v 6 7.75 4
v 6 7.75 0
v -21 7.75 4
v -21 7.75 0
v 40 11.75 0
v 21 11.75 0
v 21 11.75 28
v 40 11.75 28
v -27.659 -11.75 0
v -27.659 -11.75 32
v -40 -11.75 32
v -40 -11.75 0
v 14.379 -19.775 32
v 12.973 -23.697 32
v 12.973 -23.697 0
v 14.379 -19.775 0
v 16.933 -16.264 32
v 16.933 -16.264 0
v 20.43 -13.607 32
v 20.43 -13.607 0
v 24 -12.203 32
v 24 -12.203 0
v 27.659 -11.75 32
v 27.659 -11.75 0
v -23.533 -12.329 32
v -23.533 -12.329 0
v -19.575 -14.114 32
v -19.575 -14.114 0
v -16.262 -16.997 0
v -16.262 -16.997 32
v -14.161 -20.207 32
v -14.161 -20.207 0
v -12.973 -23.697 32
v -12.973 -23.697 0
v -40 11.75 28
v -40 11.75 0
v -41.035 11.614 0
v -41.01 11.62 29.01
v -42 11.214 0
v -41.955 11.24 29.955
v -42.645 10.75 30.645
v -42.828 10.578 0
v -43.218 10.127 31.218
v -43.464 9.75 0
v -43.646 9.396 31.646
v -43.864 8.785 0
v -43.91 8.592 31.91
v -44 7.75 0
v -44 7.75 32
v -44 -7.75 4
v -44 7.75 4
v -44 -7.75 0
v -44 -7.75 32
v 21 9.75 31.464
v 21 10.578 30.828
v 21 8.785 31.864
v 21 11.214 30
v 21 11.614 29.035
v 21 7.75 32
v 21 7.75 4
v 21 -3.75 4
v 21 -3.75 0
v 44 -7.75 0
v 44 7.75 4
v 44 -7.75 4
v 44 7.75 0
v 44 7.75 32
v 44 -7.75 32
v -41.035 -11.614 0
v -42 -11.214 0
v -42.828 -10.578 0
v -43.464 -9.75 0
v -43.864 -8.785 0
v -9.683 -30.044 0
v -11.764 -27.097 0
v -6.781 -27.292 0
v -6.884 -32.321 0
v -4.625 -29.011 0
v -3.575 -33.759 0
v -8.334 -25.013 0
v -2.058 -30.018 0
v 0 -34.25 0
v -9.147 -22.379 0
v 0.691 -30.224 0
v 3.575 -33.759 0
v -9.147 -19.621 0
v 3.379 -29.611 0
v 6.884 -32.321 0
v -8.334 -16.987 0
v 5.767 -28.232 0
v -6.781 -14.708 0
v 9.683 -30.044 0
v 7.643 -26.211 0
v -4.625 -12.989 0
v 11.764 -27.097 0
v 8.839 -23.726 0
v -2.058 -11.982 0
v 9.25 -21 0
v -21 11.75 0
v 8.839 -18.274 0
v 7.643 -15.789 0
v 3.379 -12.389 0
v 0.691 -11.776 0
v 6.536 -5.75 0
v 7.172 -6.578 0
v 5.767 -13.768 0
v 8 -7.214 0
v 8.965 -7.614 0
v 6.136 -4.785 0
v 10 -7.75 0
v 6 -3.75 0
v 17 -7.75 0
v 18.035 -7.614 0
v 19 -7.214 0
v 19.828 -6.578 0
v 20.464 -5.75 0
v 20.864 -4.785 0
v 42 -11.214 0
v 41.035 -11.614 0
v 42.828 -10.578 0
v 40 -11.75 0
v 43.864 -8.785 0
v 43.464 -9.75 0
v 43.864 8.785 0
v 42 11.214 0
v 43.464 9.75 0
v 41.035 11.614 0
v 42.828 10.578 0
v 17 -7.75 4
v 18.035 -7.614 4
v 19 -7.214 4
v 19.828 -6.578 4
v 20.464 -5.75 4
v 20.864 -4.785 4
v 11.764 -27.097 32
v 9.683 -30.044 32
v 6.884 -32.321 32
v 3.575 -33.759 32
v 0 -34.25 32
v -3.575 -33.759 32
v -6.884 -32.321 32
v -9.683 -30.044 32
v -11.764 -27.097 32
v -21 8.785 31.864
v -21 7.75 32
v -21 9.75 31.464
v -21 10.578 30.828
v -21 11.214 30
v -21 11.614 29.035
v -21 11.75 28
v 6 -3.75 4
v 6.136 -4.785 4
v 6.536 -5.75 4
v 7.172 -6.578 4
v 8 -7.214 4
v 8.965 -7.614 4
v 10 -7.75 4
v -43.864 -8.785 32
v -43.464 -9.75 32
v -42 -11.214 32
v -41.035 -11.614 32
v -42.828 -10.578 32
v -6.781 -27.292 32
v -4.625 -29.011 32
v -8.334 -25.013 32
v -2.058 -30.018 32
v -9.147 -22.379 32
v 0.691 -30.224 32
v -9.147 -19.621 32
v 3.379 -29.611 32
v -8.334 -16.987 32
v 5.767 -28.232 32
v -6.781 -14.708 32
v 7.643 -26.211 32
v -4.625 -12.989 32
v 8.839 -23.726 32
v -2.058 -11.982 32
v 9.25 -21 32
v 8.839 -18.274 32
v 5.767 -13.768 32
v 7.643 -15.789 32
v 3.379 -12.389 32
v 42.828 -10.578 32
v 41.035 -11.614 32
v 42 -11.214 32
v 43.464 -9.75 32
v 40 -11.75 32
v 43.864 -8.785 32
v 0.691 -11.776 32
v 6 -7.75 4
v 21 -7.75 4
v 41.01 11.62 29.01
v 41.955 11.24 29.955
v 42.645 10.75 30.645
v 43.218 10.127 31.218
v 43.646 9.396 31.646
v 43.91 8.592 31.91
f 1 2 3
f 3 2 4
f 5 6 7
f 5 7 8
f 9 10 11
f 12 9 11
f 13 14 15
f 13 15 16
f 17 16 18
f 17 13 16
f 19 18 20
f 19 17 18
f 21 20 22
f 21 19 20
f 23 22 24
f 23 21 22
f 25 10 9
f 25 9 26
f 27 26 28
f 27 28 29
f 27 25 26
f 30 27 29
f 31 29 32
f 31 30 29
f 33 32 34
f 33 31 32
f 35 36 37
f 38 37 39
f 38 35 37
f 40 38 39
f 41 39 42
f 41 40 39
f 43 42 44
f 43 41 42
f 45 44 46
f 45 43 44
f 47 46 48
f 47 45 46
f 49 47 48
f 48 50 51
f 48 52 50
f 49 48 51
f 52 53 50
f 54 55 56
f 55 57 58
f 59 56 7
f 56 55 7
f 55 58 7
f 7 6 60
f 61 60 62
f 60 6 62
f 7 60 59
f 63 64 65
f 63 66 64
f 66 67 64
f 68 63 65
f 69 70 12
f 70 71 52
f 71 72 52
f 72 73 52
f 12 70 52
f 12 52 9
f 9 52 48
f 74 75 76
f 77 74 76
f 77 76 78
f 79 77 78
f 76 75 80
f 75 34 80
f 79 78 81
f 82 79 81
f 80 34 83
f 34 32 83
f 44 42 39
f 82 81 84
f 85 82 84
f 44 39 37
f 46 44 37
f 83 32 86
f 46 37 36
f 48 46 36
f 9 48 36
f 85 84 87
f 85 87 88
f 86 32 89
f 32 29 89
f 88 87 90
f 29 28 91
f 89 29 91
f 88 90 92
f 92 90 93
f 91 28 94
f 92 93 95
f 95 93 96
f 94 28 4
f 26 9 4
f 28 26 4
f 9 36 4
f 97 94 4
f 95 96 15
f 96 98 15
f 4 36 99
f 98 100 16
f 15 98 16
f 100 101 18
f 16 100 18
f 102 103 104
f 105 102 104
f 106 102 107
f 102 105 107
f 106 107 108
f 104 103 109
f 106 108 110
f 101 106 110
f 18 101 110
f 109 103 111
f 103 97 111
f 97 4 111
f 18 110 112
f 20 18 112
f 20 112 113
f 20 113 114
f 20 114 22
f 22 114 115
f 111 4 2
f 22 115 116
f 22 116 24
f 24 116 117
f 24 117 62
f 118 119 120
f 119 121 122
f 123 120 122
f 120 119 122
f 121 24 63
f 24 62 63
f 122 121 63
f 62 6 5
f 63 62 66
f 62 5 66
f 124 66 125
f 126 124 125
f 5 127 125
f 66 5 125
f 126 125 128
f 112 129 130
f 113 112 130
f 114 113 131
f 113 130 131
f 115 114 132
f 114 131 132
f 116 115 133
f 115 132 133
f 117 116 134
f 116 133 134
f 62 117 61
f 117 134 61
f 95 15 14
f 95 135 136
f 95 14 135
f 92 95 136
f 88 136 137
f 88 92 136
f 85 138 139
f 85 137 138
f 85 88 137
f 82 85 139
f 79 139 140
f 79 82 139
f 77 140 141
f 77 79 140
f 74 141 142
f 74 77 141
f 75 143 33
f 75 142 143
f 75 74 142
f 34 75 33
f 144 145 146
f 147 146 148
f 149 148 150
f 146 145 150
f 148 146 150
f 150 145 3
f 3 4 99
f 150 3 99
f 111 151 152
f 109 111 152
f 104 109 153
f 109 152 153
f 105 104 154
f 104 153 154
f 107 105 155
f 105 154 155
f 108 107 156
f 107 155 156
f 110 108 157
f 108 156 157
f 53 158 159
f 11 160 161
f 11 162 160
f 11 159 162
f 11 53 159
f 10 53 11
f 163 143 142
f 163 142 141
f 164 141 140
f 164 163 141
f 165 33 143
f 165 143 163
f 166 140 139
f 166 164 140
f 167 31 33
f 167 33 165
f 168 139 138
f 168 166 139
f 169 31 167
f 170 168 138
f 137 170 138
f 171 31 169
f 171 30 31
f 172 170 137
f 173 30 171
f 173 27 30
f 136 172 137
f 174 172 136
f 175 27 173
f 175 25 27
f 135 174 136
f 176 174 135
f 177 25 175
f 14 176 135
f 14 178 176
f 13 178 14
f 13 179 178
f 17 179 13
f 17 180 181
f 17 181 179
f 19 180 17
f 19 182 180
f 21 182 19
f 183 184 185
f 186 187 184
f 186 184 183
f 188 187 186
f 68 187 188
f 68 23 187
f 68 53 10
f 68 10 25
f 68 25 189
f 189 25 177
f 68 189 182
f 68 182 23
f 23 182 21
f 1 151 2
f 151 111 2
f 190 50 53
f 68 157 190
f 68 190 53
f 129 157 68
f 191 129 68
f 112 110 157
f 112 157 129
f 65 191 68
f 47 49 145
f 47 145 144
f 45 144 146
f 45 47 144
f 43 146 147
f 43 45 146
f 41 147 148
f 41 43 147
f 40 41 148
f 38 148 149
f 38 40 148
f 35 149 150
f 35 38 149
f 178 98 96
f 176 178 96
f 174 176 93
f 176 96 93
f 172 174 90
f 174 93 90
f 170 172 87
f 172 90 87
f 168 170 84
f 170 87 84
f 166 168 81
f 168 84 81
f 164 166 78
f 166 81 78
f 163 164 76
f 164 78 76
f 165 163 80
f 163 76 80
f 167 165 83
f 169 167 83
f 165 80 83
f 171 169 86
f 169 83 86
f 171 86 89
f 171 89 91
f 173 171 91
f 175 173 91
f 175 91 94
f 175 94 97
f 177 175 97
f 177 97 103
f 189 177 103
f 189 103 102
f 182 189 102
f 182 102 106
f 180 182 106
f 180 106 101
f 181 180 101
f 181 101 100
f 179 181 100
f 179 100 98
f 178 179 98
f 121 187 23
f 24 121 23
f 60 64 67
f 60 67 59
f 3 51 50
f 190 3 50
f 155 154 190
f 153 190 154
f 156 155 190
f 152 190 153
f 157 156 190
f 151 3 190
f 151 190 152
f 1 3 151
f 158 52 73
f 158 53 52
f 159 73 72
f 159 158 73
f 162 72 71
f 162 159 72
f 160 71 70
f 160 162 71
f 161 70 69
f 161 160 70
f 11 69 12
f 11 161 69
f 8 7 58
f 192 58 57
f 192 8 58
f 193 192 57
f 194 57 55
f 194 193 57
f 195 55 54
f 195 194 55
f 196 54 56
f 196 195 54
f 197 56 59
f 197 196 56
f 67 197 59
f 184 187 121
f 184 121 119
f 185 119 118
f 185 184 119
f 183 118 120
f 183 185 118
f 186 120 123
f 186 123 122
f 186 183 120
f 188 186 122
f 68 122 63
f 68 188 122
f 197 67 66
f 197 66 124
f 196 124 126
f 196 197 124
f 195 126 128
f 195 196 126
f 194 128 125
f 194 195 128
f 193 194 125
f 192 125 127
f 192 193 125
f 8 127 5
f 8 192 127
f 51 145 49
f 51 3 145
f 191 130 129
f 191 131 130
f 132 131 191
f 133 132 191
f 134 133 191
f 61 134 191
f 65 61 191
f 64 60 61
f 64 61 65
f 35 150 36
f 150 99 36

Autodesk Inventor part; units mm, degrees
ref_plane "YZ Plane" through (0, 0, 0) normal (1, 0, 0) x (0, 1, 0)
ref_plane "XZ Plane" through (0, 0, 0) normal (0, 1, 0) x (-1, 0, 0)
ref_plane "XY Plane" through (0, 0, 0) normal (0, 0, 1) x (1, 0, 0)
sketch "Sketch1" plane through (0, 0, 0) normal (0, 0, 1) x (1, 0, 0)
  line L0 (-44, -7.75) -> (44, -7.75)
  line L1 (44, -7.75) -> (44, 7.75)
  line L2 (44, 7.75) -> (-44, 7.75)
  line L3 (-44, 7.75) -> (-44, -7.75)
  line L4 (-44, -7.75) -> (44, 7.75) construction
  line L5 (44, -7.75) -> (-44, 7.75) construction
  line L6 (-44, -7.75) -> (44, -7.75)
  line L7 (44, -7.75) -> (44, -11.75)
  line L8 (44, -11.75) -> (-44, -11.75)
  line L9 (-44, -11.75) -> (-44, -7.75)
  line L10 (-44, 7.75) -> (-21, 7.75)
  line L11 (-21, 7.75) -> (-21, 11.75)
  line L12 (-21, 11.75) -> (-44, 11.75)
  line L13 (-44, 11.75) -> (-44, 7.75)
  line L14 (44, 7.75) -> (21, 7.75)
  line L15 (21, 7.75) -> (21, 11.75)
  line L16 (21, 11.75) -> (44, 11.75)
  line L17 (44, 11.75) -> (44, 7.75)
  line L18 (0, 0) -> (0, -41.0889) construction
  circle A0 centre (0, -21) radius 9.25
  circle A1 centre (0, -21) radius 13.25
  line L19 (-13.25, -21) -> (-13.25, -11.75)
  line L20 (-13.25, -11.75) -> (-9.4868, -11.75)
  line L21 (13.25, -11.75) -> (9.4868, -11.75)
  line L22 (13.25, -21) -> (13.25, -11.75)
  line L23 (13.25, -11.75) -> (9.4868, -11.75)
  line L24 (0, 0) -> (65.293, 0) construction
  line L25 (21, -7.75) -> (6, -7.75)
  line L26 (6, -7.75) -> (6, 7.75)
  line L27 (6, 7.75) -> (21, 7.75)
  line L28 (21, 7.75) -> (21, -7.75)
  line L29 (21, -7.75) -> (6, 7.75) construction
  line L30 (6, -7.75) -> (21, 7.75) construction
  point P0 (13.25, -21)
  point P1 (13.5, 0)
  dimension "d0" = 88
  dimension "d1" = 15.5
  dimension "d2" = 4
  dimension "d3" = 4
  dimension "d4" = 23
  dimension "d5" = 23
  dimension "d6" = 18.5
  dimension "d7" = 26.5
  dimension "d8" = 90
  dimension "d19" = 15
  dimension "d20" = 15.5
  dimension "d21" = 23
extrude "main" add sketch "Sketch1" along normal blind 32 contours L0 L7 L8 A1 | A1 L8 L9 L0 | A1 L8 | L15 L16 L17 L2 | A1 L8 | L8 L22 A1 | A1 L19 L8 | L2 L13 L12 L11
extrude "bottom" add sketch "Sketch1" along normal blind 4 contours L0 L3 L2 L26 | L28 L2 L1 L0
fillet "Fillet1" radius 15 2 edges at (13.25, -11.75, 16) (-13.25, -11.75, 16)
fillet "Fillet2" radius 4 8 edges at (-44, 11.75, 16) (-44, -11.75, 16) (44, 11.75, 16) (44, -11.75, 16) (32.5, 11.75, 32) (-32.5, 11.75, 32) (21, -7.75, 2) (6, -7.75, 2)
equation "\"d2\" = wall"
equation "\"d3\" = wall2"
equation "\"d4\" = d5"
equation "\"d5\" = d21"
equation "\"d7\" = d6 + 2 * wall"
equation "\"d20\" = d1"
equation "\"d15\" = wall"
equation "\"d14\" = wall"
equation "\"wall\" = 4"
equation "\"wall2\" = 4"
properties part number "camera_holder"
